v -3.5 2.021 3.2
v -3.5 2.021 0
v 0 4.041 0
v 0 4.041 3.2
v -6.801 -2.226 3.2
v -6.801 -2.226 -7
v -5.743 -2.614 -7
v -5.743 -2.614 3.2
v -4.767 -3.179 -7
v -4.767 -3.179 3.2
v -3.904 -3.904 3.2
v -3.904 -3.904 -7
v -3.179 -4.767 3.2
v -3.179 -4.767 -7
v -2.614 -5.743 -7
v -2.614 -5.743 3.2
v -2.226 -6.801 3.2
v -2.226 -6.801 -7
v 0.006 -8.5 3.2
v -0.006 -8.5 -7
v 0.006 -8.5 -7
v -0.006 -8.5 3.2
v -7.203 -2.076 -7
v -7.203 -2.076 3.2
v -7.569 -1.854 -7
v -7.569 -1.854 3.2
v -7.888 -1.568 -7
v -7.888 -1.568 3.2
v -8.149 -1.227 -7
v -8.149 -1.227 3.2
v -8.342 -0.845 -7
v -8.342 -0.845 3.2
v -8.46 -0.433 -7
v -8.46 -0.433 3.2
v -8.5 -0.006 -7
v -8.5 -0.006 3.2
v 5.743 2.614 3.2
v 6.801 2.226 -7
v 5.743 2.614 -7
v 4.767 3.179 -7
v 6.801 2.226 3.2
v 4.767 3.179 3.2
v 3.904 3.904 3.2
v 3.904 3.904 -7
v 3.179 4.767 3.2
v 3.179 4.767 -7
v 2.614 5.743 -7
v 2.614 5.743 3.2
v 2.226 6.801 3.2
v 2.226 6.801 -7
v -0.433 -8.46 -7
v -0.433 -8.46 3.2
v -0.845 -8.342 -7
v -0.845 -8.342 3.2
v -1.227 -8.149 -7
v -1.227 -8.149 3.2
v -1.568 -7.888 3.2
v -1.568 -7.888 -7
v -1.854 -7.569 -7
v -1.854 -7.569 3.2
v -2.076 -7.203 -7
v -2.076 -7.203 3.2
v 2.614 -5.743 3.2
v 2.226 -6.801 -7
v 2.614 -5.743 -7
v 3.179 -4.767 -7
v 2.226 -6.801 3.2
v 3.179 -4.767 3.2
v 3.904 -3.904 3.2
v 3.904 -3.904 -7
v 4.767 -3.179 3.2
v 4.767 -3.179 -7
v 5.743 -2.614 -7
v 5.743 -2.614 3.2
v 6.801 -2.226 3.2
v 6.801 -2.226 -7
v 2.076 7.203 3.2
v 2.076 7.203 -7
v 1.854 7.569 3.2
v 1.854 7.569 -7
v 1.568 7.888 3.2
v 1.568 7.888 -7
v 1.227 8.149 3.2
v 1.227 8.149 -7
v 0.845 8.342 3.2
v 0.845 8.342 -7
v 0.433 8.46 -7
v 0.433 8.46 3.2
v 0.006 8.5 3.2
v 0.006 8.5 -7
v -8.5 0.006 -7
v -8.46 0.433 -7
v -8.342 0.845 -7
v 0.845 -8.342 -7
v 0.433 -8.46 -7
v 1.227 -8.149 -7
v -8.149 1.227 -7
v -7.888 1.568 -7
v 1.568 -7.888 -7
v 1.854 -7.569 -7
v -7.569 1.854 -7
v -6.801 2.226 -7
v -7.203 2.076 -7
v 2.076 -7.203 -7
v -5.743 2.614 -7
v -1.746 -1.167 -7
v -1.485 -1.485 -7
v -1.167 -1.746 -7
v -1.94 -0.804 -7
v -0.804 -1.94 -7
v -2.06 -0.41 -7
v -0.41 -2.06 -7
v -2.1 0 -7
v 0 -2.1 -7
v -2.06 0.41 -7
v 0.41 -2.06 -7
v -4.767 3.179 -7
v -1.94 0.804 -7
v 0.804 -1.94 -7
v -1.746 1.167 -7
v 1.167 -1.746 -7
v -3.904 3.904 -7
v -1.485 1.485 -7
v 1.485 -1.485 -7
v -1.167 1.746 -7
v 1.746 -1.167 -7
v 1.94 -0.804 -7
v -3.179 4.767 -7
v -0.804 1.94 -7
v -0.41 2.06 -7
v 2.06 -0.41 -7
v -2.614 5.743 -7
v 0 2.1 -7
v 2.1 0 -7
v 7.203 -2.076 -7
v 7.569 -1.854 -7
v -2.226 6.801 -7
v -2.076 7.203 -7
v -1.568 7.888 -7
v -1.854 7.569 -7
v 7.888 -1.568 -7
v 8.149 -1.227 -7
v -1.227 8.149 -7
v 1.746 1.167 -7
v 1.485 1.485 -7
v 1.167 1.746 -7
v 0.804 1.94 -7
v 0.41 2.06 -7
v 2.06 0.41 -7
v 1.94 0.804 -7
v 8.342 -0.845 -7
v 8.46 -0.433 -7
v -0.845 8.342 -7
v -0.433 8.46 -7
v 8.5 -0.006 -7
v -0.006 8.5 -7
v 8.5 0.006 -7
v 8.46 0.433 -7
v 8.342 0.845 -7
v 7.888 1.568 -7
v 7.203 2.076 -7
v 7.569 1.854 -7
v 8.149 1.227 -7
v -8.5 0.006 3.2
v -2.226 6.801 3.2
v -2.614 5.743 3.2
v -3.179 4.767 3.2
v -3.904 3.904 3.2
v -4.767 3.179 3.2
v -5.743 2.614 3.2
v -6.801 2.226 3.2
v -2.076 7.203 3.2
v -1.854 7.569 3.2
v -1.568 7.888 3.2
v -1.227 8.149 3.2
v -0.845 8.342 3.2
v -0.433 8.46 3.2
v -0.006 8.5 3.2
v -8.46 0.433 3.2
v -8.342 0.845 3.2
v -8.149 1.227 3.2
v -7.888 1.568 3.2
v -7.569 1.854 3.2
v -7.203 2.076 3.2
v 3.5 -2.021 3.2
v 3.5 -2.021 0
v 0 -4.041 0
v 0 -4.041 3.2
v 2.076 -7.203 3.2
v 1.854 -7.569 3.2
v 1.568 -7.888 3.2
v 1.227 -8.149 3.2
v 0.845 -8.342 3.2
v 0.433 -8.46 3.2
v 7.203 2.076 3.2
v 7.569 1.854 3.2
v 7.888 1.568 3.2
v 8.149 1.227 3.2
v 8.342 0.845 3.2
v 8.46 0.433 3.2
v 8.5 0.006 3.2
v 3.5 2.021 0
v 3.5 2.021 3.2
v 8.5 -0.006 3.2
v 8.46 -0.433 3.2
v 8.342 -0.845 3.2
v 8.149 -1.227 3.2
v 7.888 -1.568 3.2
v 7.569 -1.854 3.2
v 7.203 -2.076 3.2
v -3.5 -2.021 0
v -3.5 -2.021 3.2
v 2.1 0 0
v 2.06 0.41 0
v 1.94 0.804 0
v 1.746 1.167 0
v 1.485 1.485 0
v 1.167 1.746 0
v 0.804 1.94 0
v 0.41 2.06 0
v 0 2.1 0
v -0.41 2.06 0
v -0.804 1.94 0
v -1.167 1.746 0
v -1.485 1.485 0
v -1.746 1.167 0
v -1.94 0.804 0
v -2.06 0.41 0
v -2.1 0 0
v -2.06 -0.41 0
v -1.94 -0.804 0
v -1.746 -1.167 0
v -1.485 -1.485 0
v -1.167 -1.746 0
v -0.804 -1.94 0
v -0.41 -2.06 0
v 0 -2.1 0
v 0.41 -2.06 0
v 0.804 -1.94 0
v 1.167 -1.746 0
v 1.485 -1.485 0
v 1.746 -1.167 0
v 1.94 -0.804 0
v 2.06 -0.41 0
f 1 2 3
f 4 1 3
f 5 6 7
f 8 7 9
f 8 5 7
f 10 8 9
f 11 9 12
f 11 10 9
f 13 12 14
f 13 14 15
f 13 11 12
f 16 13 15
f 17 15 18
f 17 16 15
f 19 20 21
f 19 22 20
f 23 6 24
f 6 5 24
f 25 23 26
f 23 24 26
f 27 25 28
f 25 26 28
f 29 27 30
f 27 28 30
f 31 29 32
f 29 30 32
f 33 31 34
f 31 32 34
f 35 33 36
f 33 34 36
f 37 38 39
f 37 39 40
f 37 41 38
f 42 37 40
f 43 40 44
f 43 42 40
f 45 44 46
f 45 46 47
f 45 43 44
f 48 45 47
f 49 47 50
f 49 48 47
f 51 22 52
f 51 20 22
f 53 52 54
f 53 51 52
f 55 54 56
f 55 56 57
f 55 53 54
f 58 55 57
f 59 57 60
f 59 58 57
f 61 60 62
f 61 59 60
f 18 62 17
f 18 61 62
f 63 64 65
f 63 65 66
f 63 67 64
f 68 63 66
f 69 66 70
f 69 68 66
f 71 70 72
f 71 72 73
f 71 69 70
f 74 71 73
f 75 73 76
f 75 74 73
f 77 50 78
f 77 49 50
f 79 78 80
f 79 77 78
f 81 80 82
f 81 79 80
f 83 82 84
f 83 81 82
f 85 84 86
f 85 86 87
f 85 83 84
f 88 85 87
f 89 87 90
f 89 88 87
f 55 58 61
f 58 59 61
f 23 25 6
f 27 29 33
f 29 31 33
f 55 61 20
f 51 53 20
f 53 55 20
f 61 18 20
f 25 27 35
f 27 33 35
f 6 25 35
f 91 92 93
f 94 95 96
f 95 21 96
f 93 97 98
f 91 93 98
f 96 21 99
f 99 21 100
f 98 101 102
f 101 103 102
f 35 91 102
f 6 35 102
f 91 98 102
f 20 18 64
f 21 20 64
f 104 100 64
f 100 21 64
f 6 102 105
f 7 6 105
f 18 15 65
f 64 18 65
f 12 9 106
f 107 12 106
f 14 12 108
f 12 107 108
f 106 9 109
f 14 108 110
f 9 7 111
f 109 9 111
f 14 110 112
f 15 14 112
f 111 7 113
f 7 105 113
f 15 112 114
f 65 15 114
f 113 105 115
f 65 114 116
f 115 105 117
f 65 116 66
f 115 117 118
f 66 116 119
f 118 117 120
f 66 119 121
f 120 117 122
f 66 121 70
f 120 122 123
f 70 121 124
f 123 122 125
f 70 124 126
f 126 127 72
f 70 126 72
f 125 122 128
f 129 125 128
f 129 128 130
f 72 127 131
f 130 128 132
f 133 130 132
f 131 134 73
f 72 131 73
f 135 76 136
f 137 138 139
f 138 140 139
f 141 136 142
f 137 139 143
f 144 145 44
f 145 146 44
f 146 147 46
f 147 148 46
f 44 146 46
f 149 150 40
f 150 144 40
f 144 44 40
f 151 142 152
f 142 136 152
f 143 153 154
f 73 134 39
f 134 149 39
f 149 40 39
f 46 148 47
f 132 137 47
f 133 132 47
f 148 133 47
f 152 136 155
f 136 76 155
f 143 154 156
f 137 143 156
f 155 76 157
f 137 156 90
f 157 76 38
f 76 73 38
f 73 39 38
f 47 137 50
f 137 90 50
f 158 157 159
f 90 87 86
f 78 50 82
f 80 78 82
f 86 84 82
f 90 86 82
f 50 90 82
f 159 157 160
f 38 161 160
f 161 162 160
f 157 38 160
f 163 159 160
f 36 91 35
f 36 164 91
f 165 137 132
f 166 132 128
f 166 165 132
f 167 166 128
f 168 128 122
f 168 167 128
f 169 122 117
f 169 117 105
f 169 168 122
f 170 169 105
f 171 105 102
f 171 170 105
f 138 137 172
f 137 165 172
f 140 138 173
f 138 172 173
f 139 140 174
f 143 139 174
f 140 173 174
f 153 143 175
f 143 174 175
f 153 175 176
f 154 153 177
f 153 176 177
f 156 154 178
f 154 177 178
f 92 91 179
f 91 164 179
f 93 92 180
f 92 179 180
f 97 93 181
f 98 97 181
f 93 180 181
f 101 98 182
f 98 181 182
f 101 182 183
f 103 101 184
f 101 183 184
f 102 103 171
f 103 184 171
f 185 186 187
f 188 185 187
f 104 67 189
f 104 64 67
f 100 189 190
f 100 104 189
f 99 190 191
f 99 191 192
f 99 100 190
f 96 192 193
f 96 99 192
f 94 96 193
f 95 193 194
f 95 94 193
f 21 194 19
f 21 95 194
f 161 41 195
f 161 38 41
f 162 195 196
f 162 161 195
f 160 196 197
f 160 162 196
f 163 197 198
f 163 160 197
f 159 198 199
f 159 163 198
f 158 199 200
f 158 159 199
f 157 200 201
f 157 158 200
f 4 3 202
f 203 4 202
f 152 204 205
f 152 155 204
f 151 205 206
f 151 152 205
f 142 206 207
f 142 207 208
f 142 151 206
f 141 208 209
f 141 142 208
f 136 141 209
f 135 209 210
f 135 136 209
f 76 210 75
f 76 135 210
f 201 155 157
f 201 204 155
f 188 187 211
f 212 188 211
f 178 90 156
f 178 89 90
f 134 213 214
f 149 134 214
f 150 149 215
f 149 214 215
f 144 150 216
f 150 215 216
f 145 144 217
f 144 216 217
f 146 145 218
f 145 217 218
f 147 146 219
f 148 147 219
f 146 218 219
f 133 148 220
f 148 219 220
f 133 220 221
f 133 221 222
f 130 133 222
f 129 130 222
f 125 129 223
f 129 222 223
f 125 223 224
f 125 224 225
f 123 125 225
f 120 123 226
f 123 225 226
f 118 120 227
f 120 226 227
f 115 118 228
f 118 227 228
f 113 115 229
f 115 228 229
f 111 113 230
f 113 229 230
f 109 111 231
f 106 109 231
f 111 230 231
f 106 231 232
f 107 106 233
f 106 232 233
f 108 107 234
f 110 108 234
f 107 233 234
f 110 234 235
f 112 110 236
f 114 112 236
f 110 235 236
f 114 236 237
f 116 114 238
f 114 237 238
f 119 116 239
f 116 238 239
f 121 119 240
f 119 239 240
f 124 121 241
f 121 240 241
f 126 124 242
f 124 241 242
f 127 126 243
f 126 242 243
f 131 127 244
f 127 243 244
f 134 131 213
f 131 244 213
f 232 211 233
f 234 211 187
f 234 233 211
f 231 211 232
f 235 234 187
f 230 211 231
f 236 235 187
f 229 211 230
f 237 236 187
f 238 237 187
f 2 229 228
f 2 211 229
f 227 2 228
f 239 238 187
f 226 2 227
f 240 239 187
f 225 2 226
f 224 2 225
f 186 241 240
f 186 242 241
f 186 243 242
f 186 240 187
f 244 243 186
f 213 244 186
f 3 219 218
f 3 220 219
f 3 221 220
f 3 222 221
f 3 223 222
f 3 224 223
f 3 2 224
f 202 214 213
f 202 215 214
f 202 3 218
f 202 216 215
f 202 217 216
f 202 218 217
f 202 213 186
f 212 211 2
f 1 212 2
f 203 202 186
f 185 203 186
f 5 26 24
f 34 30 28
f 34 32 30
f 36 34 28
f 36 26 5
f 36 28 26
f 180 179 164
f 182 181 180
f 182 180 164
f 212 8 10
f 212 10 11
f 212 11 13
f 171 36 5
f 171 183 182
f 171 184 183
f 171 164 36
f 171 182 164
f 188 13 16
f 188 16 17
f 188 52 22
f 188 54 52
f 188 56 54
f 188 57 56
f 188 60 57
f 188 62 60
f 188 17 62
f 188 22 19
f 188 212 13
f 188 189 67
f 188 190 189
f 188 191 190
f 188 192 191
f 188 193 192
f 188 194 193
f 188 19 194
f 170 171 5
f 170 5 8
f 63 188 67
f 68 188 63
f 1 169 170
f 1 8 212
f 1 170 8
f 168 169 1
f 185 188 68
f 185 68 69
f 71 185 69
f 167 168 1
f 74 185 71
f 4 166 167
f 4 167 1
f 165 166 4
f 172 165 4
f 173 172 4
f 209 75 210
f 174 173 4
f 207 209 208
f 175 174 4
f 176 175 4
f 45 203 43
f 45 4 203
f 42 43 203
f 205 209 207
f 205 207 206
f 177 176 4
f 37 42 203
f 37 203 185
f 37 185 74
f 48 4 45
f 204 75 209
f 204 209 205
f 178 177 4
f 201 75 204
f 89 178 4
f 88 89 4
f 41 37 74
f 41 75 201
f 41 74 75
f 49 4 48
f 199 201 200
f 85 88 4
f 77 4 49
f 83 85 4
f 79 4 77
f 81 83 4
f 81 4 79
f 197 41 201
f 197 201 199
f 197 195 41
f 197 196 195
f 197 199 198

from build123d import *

# Parameters (mm, degrees)
F1_DEPTH = 3.2
F0_R     = 2.1
F2_DEPTH = 7
F3_R     = 2.3


with BuildPart() as f1:
    # F0 (on Top) → F1 (new body)
    with BuildSketch(Plane.XY):
        with BuildLine():
            Line((8.5, 0), (8.5, 2))
            ThreePointArc((8.5, 2), (3.9038059223, 3.9038059223), (2, 8.5))
            Line((2, 8.5), (0, 8.5))
            Line((0, 8.5), (-2, 8.5))
            ThreePointArc((-2, 8.5), (-3.9038059223, 3.9038059223), (-8.5, 2))
            Line((-8.5, 2), (-8.5, 0))
            Line((-8.5, 0), (-8.5, -2))
            ThreePointArc((-8.5, -2), (-3.9038059223, -3.9038059223), (-2, -8.5))
            Line((-2, -8.5), (0, -8.5))
            Line((0, -8.5), (2, -8.5))
            ThreePointArc((2, -8.5), (3.9038059223, -3.9038059223), (8.5, -2))
            Line((8.5, -2), (8.5, 0))
        make_face()
        Polygon((0, 4.0414518843), (3.5, 2.0207259422), (3.5, -2.0207259422), (0, -4.0414518843), (-3.5, -2.0207259422), (-3.5, 2.0207259422), align=None, mode=Mode.SUBTRACT)
    extrude(amount=F1_DEPTH)

    # F0 (on Top) → F2 (join)
    with BuildSketch(Plane.XY):
        with BuildLine():
            Line((8.5, 0), (8.5, 2))
            ThreePointArc((8.5, 2), (3.9038059223, 3.9038059223), (2, 8.5))
            Line((2, 8.5), (0, 8.5))
            Line((0, 8.5), (-2, 8.5))
            ThreePointArc((-2, 8.5), (-3.9038059223, 3.9038059223), (-8.5, 2))
            Line((-8.5, 2), (-8.5, 0))
            Line((-8.5, 0), (-8.5, -2))
            ThreePointArc((-8.5, -2), (-3.9038059223, -3.9038059223), (-2, -8.5))
            Line((-2, -8.5), (0, -8.5))
            Line((0, -8.5), (2, -8.5))
            ThreePointArc((2, -8.5), (3.9038059223, -3.9038059223), (8.5, -2))
            Line((8.5, -2), (8.5, 0))
        make_face()
        Polygon((0, 4.0414518843), (3.5, 2.0207259422), (3.5, -2.0207259422), (0, -4.0414518843), (-3.5, -2.0207259422), (-3.5, 2.0207259422), align=None, mode=Mode.SUBTRACT)
        Polygon((3.5, -2.0207259422), (3.5, 2.0207259422), (0, 4.0414518843), (-3.5, 2.0207259422), (-3.5, -2.0207259422), (0, -4.0414518843), align=None)
        Circle(F0_R, mode=Mode.SUBTRACT)
    extrude(amount=-F2_DEPTH)

    # F3
    f3_edges = [f1.edges().sort_by_distance(p)[0] for p in [
        (8.5, 2, -1.9),
        (8.5, -2, -1.9),
        (2, -8.5, -1.9),
        (2, 8.5, -1.9),
        (-2, 8.5, -1.9),
        (-8.5, 2, -1.9),
        (-8.5, -2, -1.9),
        (-2, -8.5, -1.9),
    ]]
    fillet(f3_edges, radius=F3_R)


solid = f1.part
